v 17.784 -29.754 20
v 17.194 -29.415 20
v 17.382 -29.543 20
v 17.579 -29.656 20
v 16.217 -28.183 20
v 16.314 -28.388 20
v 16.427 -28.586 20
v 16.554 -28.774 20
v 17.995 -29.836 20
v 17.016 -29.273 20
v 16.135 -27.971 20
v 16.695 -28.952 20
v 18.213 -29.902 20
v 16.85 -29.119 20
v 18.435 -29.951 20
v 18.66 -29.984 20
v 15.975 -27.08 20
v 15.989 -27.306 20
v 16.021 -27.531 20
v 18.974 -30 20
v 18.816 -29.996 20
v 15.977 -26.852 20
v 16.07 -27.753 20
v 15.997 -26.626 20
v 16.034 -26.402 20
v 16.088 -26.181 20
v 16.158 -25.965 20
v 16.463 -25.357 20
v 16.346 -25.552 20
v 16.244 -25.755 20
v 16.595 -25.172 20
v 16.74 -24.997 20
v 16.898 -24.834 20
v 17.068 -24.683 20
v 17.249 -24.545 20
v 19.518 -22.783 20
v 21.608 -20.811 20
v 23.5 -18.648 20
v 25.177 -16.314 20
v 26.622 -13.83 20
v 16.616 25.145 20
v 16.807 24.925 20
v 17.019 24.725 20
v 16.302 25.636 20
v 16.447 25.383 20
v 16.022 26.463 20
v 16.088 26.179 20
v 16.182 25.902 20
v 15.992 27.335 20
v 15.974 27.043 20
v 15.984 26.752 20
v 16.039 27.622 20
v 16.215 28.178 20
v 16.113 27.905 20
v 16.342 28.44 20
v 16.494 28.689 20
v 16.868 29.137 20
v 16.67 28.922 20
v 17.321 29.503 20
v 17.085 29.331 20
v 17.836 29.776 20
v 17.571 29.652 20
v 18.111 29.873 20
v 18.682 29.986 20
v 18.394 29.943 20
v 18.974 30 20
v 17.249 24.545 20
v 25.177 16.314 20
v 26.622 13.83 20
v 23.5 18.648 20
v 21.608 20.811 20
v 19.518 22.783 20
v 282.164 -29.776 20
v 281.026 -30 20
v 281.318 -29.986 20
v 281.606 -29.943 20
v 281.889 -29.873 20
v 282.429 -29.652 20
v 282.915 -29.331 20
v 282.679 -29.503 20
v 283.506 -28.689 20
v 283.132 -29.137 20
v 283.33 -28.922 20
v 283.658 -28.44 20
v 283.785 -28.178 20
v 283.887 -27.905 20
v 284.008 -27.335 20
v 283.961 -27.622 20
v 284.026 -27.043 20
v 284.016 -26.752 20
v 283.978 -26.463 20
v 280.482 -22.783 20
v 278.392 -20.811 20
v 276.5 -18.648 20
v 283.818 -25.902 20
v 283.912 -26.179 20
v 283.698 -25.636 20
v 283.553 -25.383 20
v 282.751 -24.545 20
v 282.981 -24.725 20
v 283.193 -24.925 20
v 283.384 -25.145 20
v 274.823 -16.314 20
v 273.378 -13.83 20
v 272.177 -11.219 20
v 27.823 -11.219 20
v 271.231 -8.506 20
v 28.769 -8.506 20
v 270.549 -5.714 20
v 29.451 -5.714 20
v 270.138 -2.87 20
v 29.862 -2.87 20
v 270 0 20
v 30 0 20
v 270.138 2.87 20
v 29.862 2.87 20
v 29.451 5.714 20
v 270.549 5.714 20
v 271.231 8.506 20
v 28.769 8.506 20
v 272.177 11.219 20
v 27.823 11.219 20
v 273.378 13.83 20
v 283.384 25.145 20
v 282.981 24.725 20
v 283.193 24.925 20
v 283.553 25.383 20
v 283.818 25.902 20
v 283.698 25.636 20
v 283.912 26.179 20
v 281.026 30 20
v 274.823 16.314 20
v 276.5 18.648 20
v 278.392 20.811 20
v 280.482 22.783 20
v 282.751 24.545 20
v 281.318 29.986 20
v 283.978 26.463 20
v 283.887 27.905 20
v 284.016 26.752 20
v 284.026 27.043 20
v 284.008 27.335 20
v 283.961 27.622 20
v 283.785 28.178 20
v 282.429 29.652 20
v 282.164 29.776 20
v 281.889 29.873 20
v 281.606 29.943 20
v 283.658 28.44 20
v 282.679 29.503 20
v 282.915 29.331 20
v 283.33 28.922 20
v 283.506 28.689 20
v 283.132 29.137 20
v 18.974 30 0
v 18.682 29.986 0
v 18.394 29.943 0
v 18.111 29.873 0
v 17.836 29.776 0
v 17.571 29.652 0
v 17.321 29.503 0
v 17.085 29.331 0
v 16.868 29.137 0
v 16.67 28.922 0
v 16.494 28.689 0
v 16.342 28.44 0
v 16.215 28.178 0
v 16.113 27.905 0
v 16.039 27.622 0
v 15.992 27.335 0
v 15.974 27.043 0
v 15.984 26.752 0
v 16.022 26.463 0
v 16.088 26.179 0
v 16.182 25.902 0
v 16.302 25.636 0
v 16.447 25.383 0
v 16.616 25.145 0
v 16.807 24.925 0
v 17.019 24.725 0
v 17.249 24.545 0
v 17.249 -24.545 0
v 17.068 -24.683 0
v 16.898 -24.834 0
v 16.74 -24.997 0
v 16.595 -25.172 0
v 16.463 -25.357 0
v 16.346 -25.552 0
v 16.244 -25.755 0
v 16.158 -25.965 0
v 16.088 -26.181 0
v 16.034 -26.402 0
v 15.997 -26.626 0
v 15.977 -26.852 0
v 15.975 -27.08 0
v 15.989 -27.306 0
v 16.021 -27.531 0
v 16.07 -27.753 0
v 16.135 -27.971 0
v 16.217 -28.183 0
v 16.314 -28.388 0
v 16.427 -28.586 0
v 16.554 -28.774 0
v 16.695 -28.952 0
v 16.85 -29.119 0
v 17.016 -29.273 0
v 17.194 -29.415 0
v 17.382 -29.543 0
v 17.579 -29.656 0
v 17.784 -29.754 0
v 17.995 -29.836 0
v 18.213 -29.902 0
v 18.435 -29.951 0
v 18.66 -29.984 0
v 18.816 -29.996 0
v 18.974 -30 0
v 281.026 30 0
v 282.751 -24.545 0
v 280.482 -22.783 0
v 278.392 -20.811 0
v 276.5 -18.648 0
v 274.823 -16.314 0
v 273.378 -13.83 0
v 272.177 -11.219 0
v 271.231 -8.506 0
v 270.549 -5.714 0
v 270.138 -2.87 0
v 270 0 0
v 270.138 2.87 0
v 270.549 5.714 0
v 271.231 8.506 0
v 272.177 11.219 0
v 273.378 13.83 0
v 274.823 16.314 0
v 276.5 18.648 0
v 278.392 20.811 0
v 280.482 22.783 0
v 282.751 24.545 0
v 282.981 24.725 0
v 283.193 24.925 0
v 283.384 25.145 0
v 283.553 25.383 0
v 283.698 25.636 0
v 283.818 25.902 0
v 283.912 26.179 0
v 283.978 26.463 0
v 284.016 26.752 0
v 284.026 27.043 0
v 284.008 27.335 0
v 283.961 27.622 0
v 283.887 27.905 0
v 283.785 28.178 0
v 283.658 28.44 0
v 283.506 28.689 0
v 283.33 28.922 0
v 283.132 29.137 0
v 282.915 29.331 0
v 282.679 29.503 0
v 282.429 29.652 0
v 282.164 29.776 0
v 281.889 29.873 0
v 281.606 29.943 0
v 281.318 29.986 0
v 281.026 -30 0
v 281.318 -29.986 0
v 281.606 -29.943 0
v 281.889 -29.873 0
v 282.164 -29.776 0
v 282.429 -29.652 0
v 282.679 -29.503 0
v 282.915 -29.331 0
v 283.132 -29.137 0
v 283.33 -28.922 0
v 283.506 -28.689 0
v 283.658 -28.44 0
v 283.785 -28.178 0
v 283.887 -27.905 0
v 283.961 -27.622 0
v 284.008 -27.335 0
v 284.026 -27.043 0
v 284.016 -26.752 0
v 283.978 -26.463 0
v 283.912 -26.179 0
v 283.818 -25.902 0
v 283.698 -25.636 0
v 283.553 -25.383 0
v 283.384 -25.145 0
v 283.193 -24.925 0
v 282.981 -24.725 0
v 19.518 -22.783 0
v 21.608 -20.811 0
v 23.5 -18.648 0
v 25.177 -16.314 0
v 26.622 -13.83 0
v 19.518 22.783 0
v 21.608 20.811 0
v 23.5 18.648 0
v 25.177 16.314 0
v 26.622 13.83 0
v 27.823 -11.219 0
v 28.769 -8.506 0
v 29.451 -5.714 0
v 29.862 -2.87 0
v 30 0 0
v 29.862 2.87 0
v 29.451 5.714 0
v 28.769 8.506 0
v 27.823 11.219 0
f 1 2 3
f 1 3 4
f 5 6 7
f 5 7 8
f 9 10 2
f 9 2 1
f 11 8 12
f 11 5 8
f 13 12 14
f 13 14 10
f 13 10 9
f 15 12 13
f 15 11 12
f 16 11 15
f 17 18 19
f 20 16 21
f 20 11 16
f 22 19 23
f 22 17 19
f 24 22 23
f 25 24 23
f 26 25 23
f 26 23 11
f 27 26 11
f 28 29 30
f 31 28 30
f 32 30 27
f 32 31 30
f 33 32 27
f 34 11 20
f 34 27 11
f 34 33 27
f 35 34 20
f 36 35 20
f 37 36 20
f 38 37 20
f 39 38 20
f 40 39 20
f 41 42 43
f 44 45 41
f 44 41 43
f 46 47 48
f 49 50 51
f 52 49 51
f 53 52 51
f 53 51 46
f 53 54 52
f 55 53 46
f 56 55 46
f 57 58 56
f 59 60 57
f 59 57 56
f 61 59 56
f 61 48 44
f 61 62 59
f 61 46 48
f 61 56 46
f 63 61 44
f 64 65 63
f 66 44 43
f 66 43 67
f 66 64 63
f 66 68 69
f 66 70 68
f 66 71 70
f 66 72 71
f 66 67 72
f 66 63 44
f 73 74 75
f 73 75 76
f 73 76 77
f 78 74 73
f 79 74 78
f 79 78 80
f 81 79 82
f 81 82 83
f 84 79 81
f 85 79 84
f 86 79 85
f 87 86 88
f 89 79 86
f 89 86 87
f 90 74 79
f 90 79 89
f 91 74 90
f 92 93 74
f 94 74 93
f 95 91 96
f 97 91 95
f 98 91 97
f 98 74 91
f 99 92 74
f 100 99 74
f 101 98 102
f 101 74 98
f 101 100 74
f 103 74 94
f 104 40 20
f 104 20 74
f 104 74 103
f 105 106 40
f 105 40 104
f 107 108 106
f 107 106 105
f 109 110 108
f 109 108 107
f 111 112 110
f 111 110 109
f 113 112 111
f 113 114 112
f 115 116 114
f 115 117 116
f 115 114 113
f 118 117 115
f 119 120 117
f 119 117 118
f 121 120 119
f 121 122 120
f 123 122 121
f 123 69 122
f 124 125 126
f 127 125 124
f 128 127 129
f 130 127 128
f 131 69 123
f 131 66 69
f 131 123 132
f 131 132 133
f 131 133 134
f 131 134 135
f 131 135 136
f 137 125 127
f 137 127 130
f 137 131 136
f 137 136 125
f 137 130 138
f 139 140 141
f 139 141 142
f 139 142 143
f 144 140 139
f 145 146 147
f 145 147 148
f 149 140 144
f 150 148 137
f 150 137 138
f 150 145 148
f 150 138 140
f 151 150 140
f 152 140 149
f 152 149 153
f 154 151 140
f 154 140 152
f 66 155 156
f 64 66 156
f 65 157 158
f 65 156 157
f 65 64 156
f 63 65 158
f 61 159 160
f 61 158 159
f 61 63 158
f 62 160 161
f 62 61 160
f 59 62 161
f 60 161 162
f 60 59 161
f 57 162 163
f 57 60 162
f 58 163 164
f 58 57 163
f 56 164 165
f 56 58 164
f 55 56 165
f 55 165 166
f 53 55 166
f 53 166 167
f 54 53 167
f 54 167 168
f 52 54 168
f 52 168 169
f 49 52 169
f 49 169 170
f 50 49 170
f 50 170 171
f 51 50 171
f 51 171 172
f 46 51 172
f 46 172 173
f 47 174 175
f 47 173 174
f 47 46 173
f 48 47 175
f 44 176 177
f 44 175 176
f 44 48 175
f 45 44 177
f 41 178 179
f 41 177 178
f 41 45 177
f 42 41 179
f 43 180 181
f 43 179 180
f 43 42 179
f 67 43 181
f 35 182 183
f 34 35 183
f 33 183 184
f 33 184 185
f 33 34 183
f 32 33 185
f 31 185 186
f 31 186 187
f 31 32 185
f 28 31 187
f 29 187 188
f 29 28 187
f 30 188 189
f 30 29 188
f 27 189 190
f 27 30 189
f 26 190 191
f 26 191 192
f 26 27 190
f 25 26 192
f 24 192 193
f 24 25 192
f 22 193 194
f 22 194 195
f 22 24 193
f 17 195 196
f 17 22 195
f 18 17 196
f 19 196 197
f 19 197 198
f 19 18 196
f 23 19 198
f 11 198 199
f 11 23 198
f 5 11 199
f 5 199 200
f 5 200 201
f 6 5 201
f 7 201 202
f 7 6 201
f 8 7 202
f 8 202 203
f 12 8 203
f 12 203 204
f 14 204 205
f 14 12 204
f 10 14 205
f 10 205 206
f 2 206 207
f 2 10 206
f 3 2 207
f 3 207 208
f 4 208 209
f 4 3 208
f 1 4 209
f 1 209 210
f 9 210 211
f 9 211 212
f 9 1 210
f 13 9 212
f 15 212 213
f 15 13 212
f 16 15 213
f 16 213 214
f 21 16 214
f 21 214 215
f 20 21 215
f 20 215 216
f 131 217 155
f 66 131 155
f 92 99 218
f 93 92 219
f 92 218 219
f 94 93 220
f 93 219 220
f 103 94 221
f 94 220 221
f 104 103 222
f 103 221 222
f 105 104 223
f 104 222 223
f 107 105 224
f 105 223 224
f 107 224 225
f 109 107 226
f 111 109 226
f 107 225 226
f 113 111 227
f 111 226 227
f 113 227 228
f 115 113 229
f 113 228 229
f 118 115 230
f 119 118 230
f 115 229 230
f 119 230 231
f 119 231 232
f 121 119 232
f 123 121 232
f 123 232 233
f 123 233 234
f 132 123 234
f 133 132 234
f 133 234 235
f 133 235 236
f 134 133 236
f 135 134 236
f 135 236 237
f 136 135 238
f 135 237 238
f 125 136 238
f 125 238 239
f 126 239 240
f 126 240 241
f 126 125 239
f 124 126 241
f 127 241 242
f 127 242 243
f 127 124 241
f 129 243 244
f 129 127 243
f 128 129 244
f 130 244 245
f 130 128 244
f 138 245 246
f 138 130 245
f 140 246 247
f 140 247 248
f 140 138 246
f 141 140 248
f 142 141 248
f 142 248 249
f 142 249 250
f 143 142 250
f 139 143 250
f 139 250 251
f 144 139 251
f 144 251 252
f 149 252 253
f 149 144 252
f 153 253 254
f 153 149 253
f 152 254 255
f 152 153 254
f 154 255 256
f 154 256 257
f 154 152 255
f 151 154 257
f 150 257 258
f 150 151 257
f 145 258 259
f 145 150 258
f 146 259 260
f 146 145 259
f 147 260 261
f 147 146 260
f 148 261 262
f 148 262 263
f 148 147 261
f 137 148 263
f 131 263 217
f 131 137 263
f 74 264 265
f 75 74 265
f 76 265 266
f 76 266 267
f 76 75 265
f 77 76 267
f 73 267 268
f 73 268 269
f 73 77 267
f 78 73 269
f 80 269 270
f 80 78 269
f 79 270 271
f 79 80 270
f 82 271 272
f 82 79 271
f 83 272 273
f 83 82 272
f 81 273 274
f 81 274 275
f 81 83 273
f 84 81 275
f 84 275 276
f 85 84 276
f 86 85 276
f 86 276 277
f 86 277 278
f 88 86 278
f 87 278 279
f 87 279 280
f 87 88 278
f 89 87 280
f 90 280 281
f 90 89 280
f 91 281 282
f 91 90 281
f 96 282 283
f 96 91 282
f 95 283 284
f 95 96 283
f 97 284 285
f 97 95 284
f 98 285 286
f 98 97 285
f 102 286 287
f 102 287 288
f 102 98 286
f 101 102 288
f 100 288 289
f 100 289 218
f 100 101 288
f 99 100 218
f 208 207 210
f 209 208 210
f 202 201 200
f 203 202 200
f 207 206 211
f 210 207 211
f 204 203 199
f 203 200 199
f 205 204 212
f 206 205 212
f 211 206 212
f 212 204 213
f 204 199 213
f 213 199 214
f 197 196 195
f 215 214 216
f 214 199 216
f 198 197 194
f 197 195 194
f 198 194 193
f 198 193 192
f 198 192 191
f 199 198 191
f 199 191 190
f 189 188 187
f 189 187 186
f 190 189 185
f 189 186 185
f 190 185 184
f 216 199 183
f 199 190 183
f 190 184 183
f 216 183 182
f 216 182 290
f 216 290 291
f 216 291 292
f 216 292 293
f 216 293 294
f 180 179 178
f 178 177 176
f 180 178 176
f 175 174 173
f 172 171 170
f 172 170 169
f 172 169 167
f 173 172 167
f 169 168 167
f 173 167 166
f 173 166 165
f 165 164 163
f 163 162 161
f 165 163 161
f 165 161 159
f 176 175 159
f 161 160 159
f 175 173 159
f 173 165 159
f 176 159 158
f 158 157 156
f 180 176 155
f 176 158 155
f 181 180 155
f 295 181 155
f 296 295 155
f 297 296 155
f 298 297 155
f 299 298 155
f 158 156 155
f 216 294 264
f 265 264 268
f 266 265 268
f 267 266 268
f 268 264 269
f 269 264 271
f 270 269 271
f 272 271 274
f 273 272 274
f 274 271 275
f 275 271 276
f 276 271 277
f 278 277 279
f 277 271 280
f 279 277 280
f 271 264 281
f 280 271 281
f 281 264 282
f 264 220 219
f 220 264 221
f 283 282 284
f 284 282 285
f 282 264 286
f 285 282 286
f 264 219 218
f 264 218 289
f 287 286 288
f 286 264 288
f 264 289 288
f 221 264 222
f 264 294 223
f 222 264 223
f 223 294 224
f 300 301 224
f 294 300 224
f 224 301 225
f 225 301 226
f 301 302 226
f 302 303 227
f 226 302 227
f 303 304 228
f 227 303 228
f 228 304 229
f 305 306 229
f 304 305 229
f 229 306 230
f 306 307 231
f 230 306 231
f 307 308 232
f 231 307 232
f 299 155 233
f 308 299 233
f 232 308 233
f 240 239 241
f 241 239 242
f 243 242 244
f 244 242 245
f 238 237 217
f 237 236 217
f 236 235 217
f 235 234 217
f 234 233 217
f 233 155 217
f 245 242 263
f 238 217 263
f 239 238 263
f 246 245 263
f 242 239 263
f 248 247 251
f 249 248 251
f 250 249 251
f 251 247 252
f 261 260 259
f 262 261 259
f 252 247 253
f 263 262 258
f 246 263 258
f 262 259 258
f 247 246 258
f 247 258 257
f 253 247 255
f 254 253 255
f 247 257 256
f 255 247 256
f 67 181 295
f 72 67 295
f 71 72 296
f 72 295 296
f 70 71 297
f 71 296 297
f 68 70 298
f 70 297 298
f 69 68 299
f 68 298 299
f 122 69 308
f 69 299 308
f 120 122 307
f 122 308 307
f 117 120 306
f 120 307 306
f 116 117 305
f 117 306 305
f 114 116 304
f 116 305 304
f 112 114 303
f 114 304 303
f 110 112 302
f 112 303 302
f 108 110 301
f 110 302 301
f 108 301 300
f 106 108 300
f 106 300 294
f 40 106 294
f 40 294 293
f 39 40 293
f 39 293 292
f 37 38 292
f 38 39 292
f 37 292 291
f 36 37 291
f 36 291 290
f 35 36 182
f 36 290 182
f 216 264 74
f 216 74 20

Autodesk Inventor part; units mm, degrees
ref_plane "YZ Plane" through (0, 0, 0) normal (1, 0, 0) x (0, 1, 0)
ref_plane "XZ Plane" through (0, 0, 0) normal (0, 1, 0) x (-1, 0, 0)
ref_plane "XY Plane" through (0, 0, 0) normal (0, 0, 1) x (1, 0, 0)
sketch "Sketch1" plane through (0, 0, 0) normal (0, 0, 1) x (1, 0, 0)
  arc A0 (0, -30) -> (0, 30) centre (0, 0) ccw
  line L0 (0, 0) -> (300, 0)
  arc A1 (300, 30) -> (300, -30) centre (300, 0) ccw
  line L1 (300, 30) -> (0, 30)
  line L2 (300, -30) -> (0, -30)
  dimension "d6" = 60
  dimension "d7" = 300
  dimension "d8" = 60
extrude "Extrusion2" add sketch "Sketch1" along normal blind 20
fillet "Fillet2" radius 3 4 edges at (300, 30, 10) (300, -30, 10) (0, -30, 10) (0, 30, 10)
properties part number "arm_0_extension_attacher"
